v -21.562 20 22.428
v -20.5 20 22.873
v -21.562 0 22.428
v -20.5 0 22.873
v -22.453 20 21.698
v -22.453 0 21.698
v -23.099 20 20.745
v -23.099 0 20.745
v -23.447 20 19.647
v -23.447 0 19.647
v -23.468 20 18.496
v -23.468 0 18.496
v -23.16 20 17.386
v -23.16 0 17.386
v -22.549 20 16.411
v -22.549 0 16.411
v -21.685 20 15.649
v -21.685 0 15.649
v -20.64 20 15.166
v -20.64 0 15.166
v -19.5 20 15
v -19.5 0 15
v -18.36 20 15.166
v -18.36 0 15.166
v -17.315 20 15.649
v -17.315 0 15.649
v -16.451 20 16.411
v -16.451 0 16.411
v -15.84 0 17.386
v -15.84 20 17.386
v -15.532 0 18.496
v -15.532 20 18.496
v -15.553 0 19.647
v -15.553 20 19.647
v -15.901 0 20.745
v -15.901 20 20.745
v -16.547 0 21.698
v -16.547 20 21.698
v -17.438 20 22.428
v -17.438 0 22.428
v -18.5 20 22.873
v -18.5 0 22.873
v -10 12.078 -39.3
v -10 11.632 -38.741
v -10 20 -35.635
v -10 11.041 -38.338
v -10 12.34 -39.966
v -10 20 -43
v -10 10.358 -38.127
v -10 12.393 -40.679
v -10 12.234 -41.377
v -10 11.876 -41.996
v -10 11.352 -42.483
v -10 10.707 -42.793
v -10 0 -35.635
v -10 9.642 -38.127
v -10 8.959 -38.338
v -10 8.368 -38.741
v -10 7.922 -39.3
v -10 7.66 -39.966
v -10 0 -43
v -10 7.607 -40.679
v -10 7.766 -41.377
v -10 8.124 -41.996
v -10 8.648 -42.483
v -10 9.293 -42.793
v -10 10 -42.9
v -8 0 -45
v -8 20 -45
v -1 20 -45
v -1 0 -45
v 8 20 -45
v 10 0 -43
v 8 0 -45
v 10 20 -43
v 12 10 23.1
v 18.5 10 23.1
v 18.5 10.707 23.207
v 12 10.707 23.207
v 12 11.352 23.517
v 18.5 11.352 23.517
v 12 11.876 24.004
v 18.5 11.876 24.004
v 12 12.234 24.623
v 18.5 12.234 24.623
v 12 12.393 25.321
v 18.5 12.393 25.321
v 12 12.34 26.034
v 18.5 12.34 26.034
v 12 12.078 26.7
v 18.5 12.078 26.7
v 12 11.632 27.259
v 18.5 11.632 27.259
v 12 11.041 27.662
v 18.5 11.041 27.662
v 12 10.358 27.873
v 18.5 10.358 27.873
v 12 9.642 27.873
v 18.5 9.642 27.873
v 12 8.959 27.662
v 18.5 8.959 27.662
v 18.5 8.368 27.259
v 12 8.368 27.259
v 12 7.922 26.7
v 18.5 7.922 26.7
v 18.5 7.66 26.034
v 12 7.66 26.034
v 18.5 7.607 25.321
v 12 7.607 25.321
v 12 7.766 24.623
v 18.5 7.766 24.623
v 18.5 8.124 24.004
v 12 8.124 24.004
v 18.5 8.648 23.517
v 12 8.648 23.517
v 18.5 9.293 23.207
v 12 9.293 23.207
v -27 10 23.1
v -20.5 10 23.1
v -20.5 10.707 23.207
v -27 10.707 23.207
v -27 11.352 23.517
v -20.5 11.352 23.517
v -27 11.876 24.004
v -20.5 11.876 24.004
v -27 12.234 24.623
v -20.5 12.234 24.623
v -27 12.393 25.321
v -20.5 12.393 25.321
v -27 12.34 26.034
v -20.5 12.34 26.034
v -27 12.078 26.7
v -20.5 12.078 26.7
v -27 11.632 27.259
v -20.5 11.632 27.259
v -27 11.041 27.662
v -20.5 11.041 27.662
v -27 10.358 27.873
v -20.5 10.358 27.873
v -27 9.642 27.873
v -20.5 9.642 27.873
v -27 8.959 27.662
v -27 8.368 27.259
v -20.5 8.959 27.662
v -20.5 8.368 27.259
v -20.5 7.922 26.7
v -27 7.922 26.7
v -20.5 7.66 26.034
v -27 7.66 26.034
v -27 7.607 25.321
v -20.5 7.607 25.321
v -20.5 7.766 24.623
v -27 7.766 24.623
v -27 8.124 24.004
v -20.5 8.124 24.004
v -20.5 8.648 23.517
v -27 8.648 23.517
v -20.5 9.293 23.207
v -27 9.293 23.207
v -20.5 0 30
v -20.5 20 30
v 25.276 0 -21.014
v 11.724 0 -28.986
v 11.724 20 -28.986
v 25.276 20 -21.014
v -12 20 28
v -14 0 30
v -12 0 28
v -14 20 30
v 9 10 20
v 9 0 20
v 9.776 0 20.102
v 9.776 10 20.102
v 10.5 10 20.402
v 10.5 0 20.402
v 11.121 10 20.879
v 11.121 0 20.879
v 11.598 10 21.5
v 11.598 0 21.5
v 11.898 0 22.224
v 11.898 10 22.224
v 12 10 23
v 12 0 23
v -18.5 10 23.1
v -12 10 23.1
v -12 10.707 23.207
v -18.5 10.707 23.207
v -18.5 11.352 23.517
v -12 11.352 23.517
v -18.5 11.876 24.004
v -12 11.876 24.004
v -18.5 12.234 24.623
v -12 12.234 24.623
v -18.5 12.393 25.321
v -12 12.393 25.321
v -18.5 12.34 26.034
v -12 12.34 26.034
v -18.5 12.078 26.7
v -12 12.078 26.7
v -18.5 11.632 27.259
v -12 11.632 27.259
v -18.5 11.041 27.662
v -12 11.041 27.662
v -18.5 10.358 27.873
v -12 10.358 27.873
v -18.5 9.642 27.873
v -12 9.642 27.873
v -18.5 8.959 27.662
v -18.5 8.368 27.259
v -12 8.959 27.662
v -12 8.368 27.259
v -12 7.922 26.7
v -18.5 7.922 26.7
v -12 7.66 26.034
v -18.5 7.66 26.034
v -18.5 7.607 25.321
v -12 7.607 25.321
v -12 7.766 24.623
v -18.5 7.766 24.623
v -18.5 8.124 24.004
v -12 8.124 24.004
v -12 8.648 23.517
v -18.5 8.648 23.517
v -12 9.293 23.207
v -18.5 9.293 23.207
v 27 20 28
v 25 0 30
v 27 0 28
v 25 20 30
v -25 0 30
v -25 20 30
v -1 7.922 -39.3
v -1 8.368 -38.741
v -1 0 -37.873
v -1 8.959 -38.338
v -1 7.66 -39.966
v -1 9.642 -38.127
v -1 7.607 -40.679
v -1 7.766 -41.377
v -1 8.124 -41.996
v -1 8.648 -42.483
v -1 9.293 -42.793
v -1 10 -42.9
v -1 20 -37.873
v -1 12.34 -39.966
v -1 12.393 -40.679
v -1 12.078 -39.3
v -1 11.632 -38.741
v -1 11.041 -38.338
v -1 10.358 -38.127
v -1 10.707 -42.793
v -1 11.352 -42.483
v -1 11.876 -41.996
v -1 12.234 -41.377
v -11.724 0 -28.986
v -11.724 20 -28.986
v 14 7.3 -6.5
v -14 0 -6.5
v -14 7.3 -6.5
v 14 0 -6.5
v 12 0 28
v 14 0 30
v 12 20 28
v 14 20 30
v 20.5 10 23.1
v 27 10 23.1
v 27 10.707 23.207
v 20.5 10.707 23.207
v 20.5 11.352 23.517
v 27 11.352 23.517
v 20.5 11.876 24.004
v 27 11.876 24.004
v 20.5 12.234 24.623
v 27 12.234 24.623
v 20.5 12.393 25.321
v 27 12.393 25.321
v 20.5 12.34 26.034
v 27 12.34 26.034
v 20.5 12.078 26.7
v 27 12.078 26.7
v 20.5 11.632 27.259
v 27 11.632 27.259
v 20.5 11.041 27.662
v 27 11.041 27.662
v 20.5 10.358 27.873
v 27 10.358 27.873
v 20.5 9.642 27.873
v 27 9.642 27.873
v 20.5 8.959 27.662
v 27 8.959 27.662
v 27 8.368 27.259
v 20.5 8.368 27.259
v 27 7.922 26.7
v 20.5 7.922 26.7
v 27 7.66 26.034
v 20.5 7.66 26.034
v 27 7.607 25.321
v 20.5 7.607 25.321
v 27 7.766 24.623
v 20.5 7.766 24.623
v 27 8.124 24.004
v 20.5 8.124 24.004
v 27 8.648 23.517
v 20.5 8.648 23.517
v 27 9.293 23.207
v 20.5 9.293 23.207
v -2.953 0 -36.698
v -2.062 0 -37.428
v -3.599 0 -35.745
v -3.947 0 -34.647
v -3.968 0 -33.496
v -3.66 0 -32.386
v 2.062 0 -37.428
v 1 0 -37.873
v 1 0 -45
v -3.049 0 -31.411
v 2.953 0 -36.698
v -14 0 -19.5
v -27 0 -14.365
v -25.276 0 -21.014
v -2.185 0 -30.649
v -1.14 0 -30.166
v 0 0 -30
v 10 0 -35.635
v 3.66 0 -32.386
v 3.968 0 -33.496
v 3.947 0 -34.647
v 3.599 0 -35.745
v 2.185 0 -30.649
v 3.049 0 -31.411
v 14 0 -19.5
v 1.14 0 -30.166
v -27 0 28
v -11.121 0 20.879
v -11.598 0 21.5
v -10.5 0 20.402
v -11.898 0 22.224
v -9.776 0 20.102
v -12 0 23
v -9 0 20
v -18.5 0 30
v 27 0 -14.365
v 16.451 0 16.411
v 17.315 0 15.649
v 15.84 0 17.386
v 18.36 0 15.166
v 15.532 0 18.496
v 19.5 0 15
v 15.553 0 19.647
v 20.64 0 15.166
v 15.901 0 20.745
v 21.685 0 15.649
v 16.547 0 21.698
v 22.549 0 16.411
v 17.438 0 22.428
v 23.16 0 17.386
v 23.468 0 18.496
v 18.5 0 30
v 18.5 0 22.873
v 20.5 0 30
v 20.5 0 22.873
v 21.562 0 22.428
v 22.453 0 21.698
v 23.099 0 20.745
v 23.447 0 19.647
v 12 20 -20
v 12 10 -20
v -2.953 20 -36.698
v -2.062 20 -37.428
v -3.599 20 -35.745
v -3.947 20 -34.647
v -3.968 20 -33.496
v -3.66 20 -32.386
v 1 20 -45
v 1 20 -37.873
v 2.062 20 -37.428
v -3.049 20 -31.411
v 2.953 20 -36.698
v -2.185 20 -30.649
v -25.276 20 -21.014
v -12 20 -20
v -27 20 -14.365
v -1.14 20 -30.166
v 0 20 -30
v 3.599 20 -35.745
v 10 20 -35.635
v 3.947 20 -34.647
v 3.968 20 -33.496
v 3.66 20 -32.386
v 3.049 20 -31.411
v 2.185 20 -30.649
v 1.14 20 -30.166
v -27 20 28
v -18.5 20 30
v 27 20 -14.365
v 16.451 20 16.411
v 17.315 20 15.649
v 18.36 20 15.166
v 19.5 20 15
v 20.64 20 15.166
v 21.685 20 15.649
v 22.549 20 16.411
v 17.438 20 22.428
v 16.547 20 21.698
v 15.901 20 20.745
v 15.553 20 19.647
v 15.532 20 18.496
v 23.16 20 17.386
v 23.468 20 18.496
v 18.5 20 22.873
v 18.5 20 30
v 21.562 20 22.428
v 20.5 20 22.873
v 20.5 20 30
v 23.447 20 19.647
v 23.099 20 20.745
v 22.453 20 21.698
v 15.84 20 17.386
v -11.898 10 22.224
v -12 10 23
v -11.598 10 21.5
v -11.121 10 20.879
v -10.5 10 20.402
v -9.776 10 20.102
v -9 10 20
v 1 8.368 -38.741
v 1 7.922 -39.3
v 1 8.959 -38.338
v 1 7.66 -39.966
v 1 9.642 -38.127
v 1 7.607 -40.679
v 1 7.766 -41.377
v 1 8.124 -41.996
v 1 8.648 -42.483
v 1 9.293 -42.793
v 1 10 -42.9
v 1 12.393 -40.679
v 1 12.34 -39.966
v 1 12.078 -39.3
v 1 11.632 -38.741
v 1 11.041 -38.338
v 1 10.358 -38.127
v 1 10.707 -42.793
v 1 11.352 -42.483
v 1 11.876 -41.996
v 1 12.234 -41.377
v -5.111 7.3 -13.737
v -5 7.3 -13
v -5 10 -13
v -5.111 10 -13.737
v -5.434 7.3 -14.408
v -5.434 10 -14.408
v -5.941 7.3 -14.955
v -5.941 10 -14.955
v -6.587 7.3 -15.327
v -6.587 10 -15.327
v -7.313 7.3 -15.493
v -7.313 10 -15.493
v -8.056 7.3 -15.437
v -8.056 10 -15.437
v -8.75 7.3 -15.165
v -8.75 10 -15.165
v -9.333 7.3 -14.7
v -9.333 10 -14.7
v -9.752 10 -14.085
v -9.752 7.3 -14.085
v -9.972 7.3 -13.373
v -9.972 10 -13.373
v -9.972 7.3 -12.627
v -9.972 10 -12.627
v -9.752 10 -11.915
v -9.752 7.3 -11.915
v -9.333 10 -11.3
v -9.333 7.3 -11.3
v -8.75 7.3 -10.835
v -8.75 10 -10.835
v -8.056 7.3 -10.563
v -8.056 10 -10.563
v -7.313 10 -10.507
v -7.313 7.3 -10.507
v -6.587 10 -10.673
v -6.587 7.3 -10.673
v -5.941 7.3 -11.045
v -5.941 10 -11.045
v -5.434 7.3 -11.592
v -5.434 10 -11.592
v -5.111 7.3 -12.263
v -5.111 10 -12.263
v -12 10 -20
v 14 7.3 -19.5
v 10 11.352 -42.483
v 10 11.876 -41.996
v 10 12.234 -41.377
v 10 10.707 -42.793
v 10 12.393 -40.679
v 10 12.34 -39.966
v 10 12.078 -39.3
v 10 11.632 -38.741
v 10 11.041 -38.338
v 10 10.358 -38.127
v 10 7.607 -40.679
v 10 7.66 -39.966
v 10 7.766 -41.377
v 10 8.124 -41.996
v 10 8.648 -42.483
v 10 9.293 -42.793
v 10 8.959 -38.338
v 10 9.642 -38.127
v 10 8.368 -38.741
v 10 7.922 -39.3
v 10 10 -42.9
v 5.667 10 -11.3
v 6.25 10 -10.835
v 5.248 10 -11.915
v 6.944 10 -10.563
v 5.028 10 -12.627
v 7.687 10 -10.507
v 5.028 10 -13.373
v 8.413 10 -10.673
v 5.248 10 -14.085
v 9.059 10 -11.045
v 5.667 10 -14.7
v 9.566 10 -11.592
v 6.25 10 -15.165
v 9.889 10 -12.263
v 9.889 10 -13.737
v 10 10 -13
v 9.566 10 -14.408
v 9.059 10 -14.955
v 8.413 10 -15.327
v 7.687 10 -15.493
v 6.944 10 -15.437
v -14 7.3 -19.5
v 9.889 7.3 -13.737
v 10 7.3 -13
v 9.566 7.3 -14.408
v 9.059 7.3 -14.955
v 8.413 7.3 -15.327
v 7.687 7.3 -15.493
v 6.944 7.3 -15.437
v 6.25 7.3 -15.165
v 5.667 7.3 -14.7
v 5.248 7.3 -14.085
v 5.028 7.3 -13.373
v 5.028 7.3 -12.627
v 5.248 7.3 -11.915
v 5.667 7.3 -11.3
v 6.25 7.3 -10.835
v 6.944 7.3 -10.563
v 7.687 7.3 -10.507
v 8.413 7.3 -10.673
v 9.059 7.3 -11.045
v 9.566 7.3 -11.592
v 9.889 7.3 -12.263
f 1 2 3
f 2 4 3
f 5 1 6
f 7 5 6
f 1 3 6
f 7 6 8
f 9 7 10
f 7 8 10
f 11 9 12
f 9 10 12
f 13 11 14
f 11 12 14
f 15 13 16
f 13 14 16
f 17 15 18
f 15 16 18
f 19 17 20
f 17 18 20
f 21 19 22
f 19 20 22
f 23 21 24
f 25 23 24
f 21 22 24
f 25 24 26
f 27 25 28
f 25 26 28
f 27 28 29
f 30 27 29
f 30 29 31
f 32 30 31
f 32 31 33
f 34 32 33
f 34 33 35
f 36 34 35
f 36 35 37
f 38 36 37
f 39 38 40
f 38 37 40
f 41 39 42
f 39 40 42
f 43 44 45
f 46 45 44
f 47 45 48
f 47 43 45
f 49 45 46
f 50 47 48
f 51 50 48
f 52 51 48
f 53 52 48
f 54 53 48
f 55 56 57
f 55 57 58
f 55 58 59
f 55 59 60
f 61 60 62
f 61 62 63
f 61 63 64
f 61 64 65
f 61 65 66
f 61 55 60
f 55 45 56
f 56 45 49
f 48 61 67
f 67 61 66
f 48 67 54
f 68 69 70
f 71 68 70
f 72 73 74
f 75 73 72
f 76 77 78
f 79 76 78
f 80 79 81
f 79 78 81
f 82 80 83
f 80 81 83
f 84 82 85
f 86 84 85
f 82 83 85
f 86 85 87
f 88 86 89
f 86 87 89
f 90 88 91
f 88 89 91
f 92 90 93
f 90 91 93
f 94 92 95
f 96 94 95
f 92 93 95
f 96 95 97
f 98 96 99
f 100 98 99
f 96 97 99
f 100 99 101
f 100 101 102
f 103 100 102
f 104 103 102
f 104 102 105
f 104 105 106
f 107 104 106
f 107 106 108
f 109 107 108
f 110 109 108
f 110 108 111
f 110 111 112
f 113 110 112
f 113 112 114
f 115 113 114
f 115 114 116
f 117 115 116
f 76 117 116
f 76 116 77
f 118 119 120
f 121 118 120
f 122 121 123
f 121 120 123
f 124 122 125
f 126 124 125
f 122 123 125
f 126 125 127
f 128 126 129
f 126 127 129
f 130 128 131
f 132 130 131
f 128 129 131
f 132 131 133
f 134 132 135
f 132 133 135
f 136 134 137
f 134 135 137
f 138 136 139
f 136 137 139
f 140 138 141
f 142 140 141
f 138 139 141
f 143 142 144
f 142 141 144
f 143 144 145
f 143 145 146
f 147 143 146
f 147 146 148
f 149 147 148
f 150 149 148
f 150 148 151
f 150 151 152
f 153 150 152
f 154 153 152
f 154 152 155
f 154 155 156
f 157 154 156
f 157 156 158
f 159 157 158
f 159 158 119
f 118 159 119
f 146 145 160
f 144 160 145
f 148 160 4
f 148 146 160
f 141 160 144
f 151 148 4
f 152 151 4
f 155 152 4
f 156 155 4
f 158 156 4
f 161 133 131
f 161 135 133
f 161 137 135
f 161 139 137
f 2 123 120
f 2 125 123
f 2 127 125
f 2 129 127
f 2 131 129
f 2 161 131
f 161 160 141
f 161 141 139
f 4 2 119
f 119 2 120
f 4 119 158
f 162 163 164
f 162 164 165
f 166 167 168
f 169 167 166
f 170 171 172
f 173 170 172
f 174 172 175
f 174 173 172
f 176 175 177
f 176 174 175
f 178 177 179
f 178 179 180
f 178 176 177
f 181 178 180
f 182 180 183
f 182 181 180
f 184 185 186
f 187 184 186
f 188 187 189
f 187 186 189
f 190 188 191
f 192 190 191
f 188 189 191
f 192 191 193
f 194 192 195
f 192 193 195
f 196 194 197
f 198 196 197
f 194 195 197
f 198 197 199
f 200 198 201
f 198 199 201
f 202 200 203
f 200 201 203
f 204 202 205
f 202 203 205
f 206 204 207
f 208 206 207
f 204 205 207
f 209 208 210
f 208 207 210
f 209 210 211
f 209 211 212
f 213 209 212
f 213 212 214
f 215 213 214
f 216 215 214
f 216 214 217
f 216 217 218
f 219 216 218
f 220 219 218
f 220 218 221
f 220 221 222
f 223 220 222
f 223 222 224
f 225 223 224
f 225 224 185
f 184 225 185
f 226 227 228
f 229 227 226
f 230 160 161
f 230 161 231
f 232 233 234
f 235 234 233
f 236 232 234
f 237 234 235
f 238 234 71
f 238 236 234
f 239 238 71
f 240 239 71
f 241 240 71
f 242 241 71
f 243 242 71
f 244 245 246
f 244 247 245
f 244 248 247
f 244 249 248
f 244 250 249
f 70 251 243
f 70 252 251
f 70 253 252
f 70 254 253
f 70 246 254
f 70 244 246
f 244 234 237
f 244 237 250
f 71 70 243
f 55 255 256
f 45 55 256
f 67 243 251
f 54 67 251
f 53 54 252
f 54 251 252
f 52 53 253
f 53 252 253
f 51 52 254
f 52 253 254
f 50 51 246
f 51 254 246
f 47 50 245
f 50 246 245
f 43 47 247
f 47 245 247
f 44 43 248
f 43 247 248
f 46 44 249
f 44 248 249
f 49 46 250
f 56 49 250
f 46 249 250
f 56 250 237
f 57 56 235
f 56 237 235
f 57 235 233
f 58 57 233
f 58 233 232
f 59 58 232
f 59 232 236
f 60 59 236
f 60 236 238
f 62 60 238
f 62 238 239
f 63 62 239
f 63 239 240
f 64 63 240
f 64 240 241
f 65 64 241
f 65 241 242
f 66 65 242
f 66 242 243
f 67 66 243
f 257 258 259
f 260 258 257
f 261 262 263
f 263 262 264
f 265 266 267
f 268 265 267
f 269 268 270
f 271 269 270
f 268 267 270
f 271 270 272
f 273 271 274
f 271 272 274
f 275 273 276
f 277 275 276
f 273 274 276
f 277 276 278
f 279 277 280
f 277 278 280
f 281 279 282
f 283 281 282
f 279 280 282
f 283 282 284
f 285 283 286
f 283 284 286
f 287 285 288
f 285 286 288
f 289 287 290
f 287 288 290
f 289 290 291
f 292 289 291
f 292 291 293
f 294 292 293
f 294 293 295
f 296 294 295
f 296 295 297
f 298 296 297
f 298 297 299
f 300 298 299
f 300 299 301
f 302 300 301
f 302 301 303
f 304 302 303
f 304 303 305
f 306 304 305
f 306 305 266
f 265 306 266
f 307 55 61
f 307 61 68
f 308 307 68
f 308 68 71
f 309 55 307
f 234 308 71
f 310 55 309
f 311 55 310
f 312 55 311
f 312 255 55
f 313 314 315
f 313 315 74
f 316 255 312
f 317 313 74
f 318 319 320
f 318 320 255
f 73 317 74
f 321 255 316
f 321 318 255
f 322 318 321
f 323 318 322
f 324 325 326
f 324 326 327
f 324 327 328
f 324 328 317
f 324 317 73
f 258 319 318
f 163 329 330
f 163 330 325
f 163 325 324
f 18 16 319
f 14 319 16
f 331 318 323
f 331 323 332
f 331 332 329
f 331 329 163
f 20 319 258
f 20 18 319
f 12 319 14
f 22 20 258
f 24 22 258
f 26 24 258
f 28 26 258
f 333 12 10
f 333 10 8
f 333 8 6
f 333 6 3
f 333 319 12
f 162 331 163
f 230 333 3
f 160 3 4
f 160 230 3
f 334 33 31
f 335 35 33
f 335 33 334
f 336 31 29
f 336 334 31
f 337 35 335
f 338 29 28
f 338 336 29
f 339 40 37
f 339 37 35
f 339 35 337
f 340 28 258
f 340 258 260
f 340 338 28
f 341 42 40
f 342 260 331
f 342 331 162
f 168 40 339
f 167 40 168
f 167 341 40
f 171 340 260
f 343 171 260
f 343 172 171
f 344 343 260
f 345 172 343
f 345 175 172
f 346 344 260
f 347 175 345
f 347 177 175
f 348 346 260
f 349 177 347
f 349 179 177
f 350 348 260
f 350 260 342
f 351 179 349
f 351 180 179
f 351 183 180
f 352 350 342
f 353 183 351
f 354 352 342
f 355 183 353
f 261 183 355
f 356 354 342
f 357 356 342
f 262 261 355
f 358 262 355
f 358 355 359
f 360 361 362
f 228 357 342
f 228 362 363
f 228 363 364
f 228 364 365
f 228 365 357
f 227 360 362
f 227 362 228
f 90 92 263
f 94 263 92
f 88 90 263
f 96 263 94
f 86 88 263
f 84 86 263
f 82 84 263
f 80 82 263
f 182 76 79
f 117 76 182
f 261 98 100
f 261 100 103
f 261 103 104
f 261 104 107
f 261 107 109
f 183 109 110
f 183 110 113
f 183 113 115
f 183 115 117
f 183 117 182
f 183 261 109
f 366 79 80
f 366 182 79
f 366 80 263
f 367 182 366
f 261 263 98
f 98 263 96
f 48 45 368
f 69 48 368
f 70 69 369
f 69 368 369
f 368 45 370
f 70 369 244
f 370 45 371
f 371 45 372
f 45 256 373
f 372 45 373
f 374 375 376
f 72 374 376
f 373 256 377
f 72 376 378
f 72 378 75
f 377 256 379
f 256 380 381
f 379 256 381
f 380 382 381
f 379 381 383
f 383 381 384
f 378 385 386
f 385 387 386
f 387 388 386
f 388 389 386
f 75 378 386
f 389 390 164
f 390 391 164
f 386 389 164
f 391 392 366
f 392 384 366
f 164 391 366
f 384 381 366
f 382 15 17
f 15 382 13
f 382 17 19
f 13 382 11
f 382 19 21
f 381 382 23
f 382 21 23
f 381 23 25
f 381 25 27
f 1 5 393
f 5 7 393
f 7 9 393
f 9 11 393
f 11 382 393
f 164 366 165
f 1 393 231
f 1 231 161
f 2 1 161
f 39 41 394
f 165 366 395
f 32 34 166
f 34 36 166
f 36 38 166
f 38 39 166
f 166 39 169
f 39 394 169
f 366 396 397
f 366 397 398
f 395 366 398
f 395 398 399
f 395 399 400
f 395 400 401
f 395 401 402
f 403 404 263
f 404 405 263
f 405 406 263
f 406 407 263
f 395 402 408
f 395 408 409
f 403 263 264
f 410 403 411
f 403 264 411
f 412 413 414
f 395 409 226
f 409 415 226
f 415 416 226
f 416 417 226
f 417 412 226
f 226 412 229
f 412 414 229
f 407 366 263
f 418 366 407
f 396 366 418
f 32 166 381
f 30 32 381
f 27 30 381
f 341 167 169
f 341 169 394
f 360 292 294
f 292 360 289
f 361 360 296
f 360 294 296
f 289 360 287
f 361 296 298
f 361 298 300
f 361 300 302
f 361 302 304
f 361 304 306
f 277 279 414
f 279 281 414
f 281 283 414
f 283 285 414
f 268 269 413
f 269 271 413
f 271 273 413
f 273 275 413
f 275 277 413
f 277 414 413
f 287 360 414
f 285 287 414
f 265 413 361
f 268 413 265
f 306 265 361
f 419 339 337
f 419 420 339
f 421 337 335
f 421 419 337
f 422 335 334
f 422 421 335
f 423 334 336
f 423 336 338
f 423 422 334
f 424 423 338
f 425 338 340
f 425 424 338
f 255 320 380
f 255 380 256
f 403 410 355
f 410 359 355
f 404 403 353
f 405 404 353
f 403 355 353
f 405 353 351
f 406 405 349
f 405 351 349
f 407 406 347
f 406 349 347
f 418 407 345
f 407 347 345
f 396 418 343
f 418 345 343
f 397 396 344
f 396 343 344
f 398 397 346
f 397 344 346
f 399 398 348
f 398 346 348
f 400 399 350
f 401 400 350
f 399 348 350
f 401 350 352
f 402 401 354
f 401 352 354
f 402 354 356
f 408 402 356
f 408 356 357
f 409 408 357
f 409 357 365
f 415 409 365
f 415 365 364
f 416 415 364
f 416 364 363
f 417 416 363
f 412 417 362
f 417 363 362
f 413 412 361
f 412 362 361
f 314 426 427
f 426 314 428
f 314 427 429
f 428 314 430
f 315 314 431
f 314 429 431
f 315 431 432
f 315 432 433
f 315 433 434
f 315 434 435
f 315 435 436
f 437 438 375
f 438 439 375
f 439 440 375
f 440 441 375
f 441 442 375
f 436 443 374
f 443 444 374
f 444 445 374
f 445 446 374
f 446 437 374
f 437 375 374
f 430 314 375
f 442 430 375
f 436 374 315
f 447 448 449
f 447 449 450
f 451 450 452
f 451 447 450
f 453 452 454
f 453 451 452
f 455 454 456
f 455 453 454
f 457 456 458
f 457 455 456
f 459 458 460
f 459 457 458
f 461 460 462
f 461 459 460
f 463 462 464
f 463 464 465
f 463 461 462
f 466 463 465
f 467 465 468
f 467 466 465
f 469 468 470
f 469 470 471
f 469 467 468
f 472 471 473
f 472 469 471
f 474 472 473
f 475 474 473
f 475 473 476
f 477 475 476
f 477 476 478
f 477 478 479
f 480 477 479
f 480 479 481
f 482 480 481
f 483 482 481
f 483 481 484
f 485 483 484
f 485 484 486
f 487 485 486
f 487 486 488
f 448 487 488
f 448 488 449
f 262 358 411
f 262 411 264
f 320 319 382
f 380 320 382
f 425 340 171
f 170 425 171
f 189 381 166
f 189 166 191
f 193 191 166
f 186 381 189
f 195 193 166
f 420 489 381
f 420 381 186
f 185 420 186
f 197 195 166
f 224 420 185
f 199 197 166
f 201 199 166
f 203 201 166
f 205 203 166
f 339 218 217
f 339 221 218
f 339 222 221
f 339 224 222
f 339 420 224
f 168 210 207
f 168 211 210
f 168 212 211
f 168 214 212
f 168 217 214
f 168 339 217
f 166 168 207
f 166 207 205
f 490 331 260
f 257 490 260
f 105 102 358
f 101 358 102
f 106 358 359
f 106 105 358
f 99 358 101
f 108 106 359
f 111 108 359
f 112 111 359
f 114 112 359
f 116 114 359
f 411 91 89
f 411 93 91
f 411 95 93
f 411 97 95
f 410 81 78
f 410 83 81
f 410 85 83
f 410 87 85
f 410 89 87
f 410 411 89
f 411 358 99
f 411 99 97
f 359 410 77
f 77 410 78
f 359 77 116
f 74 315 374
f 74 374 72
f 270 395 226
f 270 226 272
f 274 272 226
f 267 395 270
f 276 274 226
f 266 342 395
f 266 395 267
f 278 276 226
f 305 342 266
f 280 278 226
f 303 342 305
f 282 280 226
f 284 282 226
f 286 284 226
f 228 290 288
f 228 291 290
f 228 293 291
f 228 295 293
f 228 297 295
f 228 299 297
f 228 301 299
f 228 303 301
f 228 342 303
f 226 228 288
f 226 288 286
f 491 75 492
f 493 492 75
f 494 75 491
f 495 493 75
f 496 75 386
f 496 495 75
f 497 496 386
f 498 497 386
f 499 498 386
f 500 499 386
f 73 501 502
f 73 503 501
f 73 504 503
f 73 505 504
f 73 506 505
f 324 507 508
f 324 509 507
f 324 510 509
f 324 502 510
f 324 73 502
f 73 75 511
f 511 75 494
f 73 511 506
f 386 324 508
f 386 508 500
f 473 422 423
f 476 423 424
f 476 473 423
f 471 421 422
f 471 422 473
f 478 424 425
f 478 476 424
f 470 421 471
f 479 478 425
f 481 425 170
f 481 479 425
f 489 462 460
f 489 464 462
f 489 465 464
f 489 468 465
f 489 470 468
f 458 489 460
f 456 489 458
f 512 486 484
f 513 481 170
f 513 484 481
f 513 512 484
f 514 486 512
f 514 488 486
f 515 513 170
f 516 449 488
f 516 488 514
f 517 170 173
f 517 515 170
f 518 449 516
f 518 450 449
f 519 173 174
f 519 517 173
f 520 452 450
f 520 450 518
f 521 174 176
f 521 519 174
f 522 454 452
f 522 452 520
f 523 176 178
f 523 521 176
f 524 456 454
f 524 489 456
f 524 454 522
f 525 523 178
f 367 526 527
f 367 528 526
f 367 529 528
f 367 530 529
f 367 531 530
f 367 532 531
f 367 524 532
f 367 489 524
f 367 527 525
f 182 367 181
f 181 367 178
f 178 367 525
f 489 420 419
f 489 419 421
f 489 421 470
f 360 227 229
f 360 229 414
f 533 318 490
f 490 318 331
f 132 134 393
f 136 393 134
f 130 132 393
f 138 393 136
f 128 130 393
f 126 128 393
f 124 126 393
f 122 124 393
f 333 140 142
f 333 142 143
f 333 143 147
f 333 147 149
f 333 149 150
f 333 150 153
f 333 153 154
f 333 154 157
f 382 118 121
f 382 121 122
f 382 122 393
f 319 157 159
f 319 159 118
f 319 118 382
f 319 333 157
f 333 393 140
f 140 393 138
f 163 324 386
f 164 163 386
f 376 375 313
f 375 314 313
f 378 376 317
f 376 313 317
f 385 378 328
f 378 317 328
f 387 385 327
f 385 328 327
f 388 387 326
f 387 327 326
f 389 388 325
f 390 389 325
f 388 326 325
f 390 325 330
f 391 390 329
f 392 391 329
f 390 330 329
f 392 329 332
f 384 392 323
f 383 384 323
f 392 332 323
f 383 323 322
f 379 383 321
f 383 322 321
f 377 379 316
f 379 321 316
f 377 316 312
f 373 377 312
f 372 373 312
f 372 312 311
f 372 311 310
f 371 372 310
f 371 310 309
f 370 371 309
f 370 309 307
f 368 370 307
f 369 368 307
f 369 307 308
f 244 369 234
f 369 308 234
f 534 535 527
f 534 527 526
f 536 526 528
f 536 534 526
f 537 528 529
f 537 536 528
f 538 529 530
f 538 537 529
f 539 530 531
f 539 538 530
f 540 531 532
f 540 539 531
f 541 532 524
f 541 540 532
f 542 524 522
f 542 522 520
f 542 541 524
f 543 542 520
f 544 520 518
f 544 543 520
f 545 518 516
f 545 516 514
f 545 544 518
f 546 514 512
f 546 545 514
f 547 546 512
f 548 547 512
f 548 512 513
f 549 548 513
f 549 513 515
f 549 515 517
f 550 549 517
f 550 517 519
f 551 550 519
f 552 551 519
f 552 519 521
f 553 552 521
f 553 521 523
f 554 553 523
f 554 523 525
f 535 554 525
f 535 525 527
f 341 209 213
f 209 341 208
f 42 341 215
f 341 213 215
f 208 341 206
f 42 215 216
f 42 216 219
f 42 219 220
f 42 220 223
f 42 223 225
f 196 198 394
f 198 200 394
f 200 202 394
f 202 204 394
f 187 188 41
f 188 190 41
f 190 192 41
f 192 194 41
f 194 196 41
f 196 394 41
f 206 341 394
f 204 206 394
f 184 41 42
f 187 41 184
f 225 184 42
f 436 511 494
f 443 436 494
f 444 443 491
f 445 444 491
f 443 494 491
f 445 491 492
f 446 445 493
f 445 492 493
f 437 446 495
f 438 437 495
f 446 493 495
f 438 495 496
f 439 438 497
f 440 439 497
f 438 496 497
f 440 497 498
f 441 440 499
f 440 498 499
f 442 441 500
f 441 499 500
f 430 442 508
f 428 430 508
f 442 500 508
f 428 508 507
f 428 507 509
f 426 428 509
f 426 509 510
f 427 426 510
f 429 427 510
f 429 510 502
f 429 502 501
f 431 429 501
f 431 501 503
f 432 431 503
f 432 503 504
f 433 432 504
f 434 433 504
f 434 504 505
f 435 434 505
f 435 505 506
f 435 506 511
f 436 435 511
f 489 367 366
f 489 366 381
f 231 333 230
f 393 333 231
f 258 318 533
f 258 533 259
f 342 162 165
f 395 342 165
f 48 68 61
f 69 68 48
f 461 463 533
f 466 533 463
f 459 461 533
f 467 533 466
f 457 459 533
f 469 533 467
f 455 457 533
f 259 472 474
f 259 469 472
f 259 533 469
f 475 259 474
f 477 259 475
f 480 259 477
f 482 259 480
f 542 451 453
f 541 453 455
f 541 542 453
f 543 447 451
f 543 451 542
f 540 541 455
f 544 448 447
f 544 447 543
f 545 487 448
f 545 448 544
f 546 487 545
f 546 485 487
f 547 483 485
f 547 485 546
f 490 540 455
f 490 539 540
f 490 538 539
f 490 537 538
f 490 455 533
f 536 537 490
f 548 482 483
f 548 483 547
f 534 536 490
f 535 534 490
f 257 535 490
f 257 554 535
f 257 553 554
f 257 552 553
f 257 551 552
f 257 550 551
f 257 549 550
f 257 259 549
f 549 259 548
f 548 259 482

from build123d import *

# Parameters (mm, degrees)
SKETCH1_W             = 24
SKETCH1_H             = 40
SKETCH1_R             = 2.5
BOSS_EXTRUDE1_DEPTH   = 10
SKETCH2_R             = 4
BOSS_EXTRUDE2_DEPTH   = 20
SKETCH4_W             = 2
SKETCH4_H             = 15
CUT_EXTRUDE1_DEPTH    = 20
SKETCH5_R             = 2.4
CUT_EXTRUDE2_DEPTH    = 56
CHAMFER2_SIZE         = 2
CHAMFER3_SIZE2        = 2
CHAMFER3_SIZE         = 5.63516655
CHAMFER3_EDGE_2_SIZE2 = 5.63516655
CHAMFER3_EDGE_2_SIZE  = 2
CHAMFER3_EDGE_3_SIZE2 = 2
CHAMFER3_EDGE_3_SIZE  = 5.63516655
CHAMFER3_EDGE_4_SIZE2 = 5.63516655
CHAMFER3_EDGE_4_SIZE  = 2
FILLET2_R             = 3
SKETCH6_W             = 28
SKETCH6_H             = 13
CUT_EXTRUDE3_DEPTH    = 7.3


with BuildPart() as part:
    # Sketch1 → Boss-Extrude1 (new body)
    with BuildSketch(Plane(origin=(0, 0, 0), x_dir=(1, 0, 0), z_dir=(0, 1, 0))):
        Rectangle(SKETCH1_W, SKETCH1_H)
        with Locations((7.5, 13)):
            Circle(SKETCH1_R, mode=Mode.SUBTRACT)
        with Locations((-7.5, 13)):
            Circle(SKETCH1_R, mode=Mode.SUBTRACT)
    extrude(amount=BOSS_EXTRUDE1_DEPTH)

    # Sketch2 → Boss-Extrude2 (add)
    with BuildSketch(Plane.XZ):
        Polygon((-12, -20), (-12, 30), (-27, 30), (-27, -20), (-10, -30), (-10, -45), (10, -45), (10, -30), (27, -20), (27, 30), (12, 30), (12, -20), align=None)
        with Locations((0, -34)):
            Circle(SKETCH2_R, mode=Mode.SUBTRACT)
        with Locations((-19.5, 19)):
            Circle(SKETCH2_R, mode=Mode.SUBTRACT)
        with Locations((19.5, 19)):
            Circle(SKETCH2_R, mode=Mode.SUBTRACT)
    extrude(amount=-BOSS_EXTRUDE2_DEPTH)

    # Sketch4 → Cut-Extrude1 (cut)
    with BuildSketch(Plane(origin=(0, 20, 0), x_dir=(1, 0, 0), z_dir=(0, 1, 0))):
        with Locations((19.5, -30)):
            Rectangle(SKETCH4_W, SKETCH4_H)
        with Locations((-19.5, -30)):
            Rectangle(SKETCH4_W, SKETCH4_H)
        with Locations((0, 45)):
            Rectangle(SKETCH4_W, SKETCH4_H)
    extrude(amount=-CUT_EXTRUDE1_DEPTH, mode=Mode.SUBTRACT)

    # Sketch5 → Cut-Extrude2 (cut)
    with BuildSketch(Plane(origin=(27, 0, 0), x_dir=(0, 0, -1), z_dir=(1, 0, 0))):
        with Locations((-25.5, 10)):
            Circle(SKETCH5_R)
        with Locations((40.5, 10)):
            Circle(SKETCH5_R)
    extrude(amount=-CUT_EXTRUDE2_DEPTH, mode=Mode.SUBTRACT)

    # Chamfer2
    chamfer2_edges = [part.edges().sort_by_distance(p)[0] for p in [
        (12, 10, 30),
        (27, 10, 30),
        (10, 10, -45),
        (-10, 10, -45),
        (-27, 10, 30),
        (-12, 10, 30),
    ]]
    chamfer(chamfer2_edges, length=CHAMFER2_SIZE)

    # Chamfer3
    chamfer3_edges = [part.edges().sort_by_distance(p)[0] for p in [
        (27, 10, -20),
    ]]
    chamfer(chamfer3_edges, length=CHAMFER3_SIZE, length2=CHAMFER3_SIZE2)

    # Chamfer3 edge 2
    chamfer3_edge_2_edges = [part.edges().sort_by_distance(p)[0] for p in [
        (10, 10, -30),
    ]]
    chamfer(chamfer3_edge_2_edges, length=CHAMFER3_EDGE_2_SIZE, length2=CHAMFER3_EDGE_2_SIZE2)

    # Chamfer3 edge 3
    chamfer3_edge_3_edges = [part.edges().sort_by_distance(p)[0] for p in [
        (-10, 10, -30),
    ]]
    chamfer(chamfer3_edge_3_edges, length=CHAMFER3_EDGE_3_SIZE, length2=CHAMFER3_EDGE_3_SIZE2)

    # Chamfer3 edge 4
    chamfer3_edge_4_edges = [part.edges().sort_by_distance(p)[0] for p in [
        (-27, 10, -20),
    ]]
    chamfer(chamfer3_edge_4_edges, length=CHAMFER3_EDGE_4_SIZE, length2=CHAMFER3_EDGE_4_SIZE2)

    # Fillet2
    fillet2_edges = [part.edges().sort_by_distance(p)[0] for p in [
        (12, 5, 20),
        (-12, 5, 20),
    ]]
    fillet(fillet2_edges, radius=FILLET2_R)

    # Sketch6 → Cut-Extrude3 (cut)
    with BuildSketch(Plane.XZ):
        with Locations((0, -13)):
            Rectangle(SKETCH6_W, SKETCH6_H)
    extrude(amount=-CUT_EXTRUDE3_DEPTH, mode=Mode.SUBTRACT)


solid = part.part
